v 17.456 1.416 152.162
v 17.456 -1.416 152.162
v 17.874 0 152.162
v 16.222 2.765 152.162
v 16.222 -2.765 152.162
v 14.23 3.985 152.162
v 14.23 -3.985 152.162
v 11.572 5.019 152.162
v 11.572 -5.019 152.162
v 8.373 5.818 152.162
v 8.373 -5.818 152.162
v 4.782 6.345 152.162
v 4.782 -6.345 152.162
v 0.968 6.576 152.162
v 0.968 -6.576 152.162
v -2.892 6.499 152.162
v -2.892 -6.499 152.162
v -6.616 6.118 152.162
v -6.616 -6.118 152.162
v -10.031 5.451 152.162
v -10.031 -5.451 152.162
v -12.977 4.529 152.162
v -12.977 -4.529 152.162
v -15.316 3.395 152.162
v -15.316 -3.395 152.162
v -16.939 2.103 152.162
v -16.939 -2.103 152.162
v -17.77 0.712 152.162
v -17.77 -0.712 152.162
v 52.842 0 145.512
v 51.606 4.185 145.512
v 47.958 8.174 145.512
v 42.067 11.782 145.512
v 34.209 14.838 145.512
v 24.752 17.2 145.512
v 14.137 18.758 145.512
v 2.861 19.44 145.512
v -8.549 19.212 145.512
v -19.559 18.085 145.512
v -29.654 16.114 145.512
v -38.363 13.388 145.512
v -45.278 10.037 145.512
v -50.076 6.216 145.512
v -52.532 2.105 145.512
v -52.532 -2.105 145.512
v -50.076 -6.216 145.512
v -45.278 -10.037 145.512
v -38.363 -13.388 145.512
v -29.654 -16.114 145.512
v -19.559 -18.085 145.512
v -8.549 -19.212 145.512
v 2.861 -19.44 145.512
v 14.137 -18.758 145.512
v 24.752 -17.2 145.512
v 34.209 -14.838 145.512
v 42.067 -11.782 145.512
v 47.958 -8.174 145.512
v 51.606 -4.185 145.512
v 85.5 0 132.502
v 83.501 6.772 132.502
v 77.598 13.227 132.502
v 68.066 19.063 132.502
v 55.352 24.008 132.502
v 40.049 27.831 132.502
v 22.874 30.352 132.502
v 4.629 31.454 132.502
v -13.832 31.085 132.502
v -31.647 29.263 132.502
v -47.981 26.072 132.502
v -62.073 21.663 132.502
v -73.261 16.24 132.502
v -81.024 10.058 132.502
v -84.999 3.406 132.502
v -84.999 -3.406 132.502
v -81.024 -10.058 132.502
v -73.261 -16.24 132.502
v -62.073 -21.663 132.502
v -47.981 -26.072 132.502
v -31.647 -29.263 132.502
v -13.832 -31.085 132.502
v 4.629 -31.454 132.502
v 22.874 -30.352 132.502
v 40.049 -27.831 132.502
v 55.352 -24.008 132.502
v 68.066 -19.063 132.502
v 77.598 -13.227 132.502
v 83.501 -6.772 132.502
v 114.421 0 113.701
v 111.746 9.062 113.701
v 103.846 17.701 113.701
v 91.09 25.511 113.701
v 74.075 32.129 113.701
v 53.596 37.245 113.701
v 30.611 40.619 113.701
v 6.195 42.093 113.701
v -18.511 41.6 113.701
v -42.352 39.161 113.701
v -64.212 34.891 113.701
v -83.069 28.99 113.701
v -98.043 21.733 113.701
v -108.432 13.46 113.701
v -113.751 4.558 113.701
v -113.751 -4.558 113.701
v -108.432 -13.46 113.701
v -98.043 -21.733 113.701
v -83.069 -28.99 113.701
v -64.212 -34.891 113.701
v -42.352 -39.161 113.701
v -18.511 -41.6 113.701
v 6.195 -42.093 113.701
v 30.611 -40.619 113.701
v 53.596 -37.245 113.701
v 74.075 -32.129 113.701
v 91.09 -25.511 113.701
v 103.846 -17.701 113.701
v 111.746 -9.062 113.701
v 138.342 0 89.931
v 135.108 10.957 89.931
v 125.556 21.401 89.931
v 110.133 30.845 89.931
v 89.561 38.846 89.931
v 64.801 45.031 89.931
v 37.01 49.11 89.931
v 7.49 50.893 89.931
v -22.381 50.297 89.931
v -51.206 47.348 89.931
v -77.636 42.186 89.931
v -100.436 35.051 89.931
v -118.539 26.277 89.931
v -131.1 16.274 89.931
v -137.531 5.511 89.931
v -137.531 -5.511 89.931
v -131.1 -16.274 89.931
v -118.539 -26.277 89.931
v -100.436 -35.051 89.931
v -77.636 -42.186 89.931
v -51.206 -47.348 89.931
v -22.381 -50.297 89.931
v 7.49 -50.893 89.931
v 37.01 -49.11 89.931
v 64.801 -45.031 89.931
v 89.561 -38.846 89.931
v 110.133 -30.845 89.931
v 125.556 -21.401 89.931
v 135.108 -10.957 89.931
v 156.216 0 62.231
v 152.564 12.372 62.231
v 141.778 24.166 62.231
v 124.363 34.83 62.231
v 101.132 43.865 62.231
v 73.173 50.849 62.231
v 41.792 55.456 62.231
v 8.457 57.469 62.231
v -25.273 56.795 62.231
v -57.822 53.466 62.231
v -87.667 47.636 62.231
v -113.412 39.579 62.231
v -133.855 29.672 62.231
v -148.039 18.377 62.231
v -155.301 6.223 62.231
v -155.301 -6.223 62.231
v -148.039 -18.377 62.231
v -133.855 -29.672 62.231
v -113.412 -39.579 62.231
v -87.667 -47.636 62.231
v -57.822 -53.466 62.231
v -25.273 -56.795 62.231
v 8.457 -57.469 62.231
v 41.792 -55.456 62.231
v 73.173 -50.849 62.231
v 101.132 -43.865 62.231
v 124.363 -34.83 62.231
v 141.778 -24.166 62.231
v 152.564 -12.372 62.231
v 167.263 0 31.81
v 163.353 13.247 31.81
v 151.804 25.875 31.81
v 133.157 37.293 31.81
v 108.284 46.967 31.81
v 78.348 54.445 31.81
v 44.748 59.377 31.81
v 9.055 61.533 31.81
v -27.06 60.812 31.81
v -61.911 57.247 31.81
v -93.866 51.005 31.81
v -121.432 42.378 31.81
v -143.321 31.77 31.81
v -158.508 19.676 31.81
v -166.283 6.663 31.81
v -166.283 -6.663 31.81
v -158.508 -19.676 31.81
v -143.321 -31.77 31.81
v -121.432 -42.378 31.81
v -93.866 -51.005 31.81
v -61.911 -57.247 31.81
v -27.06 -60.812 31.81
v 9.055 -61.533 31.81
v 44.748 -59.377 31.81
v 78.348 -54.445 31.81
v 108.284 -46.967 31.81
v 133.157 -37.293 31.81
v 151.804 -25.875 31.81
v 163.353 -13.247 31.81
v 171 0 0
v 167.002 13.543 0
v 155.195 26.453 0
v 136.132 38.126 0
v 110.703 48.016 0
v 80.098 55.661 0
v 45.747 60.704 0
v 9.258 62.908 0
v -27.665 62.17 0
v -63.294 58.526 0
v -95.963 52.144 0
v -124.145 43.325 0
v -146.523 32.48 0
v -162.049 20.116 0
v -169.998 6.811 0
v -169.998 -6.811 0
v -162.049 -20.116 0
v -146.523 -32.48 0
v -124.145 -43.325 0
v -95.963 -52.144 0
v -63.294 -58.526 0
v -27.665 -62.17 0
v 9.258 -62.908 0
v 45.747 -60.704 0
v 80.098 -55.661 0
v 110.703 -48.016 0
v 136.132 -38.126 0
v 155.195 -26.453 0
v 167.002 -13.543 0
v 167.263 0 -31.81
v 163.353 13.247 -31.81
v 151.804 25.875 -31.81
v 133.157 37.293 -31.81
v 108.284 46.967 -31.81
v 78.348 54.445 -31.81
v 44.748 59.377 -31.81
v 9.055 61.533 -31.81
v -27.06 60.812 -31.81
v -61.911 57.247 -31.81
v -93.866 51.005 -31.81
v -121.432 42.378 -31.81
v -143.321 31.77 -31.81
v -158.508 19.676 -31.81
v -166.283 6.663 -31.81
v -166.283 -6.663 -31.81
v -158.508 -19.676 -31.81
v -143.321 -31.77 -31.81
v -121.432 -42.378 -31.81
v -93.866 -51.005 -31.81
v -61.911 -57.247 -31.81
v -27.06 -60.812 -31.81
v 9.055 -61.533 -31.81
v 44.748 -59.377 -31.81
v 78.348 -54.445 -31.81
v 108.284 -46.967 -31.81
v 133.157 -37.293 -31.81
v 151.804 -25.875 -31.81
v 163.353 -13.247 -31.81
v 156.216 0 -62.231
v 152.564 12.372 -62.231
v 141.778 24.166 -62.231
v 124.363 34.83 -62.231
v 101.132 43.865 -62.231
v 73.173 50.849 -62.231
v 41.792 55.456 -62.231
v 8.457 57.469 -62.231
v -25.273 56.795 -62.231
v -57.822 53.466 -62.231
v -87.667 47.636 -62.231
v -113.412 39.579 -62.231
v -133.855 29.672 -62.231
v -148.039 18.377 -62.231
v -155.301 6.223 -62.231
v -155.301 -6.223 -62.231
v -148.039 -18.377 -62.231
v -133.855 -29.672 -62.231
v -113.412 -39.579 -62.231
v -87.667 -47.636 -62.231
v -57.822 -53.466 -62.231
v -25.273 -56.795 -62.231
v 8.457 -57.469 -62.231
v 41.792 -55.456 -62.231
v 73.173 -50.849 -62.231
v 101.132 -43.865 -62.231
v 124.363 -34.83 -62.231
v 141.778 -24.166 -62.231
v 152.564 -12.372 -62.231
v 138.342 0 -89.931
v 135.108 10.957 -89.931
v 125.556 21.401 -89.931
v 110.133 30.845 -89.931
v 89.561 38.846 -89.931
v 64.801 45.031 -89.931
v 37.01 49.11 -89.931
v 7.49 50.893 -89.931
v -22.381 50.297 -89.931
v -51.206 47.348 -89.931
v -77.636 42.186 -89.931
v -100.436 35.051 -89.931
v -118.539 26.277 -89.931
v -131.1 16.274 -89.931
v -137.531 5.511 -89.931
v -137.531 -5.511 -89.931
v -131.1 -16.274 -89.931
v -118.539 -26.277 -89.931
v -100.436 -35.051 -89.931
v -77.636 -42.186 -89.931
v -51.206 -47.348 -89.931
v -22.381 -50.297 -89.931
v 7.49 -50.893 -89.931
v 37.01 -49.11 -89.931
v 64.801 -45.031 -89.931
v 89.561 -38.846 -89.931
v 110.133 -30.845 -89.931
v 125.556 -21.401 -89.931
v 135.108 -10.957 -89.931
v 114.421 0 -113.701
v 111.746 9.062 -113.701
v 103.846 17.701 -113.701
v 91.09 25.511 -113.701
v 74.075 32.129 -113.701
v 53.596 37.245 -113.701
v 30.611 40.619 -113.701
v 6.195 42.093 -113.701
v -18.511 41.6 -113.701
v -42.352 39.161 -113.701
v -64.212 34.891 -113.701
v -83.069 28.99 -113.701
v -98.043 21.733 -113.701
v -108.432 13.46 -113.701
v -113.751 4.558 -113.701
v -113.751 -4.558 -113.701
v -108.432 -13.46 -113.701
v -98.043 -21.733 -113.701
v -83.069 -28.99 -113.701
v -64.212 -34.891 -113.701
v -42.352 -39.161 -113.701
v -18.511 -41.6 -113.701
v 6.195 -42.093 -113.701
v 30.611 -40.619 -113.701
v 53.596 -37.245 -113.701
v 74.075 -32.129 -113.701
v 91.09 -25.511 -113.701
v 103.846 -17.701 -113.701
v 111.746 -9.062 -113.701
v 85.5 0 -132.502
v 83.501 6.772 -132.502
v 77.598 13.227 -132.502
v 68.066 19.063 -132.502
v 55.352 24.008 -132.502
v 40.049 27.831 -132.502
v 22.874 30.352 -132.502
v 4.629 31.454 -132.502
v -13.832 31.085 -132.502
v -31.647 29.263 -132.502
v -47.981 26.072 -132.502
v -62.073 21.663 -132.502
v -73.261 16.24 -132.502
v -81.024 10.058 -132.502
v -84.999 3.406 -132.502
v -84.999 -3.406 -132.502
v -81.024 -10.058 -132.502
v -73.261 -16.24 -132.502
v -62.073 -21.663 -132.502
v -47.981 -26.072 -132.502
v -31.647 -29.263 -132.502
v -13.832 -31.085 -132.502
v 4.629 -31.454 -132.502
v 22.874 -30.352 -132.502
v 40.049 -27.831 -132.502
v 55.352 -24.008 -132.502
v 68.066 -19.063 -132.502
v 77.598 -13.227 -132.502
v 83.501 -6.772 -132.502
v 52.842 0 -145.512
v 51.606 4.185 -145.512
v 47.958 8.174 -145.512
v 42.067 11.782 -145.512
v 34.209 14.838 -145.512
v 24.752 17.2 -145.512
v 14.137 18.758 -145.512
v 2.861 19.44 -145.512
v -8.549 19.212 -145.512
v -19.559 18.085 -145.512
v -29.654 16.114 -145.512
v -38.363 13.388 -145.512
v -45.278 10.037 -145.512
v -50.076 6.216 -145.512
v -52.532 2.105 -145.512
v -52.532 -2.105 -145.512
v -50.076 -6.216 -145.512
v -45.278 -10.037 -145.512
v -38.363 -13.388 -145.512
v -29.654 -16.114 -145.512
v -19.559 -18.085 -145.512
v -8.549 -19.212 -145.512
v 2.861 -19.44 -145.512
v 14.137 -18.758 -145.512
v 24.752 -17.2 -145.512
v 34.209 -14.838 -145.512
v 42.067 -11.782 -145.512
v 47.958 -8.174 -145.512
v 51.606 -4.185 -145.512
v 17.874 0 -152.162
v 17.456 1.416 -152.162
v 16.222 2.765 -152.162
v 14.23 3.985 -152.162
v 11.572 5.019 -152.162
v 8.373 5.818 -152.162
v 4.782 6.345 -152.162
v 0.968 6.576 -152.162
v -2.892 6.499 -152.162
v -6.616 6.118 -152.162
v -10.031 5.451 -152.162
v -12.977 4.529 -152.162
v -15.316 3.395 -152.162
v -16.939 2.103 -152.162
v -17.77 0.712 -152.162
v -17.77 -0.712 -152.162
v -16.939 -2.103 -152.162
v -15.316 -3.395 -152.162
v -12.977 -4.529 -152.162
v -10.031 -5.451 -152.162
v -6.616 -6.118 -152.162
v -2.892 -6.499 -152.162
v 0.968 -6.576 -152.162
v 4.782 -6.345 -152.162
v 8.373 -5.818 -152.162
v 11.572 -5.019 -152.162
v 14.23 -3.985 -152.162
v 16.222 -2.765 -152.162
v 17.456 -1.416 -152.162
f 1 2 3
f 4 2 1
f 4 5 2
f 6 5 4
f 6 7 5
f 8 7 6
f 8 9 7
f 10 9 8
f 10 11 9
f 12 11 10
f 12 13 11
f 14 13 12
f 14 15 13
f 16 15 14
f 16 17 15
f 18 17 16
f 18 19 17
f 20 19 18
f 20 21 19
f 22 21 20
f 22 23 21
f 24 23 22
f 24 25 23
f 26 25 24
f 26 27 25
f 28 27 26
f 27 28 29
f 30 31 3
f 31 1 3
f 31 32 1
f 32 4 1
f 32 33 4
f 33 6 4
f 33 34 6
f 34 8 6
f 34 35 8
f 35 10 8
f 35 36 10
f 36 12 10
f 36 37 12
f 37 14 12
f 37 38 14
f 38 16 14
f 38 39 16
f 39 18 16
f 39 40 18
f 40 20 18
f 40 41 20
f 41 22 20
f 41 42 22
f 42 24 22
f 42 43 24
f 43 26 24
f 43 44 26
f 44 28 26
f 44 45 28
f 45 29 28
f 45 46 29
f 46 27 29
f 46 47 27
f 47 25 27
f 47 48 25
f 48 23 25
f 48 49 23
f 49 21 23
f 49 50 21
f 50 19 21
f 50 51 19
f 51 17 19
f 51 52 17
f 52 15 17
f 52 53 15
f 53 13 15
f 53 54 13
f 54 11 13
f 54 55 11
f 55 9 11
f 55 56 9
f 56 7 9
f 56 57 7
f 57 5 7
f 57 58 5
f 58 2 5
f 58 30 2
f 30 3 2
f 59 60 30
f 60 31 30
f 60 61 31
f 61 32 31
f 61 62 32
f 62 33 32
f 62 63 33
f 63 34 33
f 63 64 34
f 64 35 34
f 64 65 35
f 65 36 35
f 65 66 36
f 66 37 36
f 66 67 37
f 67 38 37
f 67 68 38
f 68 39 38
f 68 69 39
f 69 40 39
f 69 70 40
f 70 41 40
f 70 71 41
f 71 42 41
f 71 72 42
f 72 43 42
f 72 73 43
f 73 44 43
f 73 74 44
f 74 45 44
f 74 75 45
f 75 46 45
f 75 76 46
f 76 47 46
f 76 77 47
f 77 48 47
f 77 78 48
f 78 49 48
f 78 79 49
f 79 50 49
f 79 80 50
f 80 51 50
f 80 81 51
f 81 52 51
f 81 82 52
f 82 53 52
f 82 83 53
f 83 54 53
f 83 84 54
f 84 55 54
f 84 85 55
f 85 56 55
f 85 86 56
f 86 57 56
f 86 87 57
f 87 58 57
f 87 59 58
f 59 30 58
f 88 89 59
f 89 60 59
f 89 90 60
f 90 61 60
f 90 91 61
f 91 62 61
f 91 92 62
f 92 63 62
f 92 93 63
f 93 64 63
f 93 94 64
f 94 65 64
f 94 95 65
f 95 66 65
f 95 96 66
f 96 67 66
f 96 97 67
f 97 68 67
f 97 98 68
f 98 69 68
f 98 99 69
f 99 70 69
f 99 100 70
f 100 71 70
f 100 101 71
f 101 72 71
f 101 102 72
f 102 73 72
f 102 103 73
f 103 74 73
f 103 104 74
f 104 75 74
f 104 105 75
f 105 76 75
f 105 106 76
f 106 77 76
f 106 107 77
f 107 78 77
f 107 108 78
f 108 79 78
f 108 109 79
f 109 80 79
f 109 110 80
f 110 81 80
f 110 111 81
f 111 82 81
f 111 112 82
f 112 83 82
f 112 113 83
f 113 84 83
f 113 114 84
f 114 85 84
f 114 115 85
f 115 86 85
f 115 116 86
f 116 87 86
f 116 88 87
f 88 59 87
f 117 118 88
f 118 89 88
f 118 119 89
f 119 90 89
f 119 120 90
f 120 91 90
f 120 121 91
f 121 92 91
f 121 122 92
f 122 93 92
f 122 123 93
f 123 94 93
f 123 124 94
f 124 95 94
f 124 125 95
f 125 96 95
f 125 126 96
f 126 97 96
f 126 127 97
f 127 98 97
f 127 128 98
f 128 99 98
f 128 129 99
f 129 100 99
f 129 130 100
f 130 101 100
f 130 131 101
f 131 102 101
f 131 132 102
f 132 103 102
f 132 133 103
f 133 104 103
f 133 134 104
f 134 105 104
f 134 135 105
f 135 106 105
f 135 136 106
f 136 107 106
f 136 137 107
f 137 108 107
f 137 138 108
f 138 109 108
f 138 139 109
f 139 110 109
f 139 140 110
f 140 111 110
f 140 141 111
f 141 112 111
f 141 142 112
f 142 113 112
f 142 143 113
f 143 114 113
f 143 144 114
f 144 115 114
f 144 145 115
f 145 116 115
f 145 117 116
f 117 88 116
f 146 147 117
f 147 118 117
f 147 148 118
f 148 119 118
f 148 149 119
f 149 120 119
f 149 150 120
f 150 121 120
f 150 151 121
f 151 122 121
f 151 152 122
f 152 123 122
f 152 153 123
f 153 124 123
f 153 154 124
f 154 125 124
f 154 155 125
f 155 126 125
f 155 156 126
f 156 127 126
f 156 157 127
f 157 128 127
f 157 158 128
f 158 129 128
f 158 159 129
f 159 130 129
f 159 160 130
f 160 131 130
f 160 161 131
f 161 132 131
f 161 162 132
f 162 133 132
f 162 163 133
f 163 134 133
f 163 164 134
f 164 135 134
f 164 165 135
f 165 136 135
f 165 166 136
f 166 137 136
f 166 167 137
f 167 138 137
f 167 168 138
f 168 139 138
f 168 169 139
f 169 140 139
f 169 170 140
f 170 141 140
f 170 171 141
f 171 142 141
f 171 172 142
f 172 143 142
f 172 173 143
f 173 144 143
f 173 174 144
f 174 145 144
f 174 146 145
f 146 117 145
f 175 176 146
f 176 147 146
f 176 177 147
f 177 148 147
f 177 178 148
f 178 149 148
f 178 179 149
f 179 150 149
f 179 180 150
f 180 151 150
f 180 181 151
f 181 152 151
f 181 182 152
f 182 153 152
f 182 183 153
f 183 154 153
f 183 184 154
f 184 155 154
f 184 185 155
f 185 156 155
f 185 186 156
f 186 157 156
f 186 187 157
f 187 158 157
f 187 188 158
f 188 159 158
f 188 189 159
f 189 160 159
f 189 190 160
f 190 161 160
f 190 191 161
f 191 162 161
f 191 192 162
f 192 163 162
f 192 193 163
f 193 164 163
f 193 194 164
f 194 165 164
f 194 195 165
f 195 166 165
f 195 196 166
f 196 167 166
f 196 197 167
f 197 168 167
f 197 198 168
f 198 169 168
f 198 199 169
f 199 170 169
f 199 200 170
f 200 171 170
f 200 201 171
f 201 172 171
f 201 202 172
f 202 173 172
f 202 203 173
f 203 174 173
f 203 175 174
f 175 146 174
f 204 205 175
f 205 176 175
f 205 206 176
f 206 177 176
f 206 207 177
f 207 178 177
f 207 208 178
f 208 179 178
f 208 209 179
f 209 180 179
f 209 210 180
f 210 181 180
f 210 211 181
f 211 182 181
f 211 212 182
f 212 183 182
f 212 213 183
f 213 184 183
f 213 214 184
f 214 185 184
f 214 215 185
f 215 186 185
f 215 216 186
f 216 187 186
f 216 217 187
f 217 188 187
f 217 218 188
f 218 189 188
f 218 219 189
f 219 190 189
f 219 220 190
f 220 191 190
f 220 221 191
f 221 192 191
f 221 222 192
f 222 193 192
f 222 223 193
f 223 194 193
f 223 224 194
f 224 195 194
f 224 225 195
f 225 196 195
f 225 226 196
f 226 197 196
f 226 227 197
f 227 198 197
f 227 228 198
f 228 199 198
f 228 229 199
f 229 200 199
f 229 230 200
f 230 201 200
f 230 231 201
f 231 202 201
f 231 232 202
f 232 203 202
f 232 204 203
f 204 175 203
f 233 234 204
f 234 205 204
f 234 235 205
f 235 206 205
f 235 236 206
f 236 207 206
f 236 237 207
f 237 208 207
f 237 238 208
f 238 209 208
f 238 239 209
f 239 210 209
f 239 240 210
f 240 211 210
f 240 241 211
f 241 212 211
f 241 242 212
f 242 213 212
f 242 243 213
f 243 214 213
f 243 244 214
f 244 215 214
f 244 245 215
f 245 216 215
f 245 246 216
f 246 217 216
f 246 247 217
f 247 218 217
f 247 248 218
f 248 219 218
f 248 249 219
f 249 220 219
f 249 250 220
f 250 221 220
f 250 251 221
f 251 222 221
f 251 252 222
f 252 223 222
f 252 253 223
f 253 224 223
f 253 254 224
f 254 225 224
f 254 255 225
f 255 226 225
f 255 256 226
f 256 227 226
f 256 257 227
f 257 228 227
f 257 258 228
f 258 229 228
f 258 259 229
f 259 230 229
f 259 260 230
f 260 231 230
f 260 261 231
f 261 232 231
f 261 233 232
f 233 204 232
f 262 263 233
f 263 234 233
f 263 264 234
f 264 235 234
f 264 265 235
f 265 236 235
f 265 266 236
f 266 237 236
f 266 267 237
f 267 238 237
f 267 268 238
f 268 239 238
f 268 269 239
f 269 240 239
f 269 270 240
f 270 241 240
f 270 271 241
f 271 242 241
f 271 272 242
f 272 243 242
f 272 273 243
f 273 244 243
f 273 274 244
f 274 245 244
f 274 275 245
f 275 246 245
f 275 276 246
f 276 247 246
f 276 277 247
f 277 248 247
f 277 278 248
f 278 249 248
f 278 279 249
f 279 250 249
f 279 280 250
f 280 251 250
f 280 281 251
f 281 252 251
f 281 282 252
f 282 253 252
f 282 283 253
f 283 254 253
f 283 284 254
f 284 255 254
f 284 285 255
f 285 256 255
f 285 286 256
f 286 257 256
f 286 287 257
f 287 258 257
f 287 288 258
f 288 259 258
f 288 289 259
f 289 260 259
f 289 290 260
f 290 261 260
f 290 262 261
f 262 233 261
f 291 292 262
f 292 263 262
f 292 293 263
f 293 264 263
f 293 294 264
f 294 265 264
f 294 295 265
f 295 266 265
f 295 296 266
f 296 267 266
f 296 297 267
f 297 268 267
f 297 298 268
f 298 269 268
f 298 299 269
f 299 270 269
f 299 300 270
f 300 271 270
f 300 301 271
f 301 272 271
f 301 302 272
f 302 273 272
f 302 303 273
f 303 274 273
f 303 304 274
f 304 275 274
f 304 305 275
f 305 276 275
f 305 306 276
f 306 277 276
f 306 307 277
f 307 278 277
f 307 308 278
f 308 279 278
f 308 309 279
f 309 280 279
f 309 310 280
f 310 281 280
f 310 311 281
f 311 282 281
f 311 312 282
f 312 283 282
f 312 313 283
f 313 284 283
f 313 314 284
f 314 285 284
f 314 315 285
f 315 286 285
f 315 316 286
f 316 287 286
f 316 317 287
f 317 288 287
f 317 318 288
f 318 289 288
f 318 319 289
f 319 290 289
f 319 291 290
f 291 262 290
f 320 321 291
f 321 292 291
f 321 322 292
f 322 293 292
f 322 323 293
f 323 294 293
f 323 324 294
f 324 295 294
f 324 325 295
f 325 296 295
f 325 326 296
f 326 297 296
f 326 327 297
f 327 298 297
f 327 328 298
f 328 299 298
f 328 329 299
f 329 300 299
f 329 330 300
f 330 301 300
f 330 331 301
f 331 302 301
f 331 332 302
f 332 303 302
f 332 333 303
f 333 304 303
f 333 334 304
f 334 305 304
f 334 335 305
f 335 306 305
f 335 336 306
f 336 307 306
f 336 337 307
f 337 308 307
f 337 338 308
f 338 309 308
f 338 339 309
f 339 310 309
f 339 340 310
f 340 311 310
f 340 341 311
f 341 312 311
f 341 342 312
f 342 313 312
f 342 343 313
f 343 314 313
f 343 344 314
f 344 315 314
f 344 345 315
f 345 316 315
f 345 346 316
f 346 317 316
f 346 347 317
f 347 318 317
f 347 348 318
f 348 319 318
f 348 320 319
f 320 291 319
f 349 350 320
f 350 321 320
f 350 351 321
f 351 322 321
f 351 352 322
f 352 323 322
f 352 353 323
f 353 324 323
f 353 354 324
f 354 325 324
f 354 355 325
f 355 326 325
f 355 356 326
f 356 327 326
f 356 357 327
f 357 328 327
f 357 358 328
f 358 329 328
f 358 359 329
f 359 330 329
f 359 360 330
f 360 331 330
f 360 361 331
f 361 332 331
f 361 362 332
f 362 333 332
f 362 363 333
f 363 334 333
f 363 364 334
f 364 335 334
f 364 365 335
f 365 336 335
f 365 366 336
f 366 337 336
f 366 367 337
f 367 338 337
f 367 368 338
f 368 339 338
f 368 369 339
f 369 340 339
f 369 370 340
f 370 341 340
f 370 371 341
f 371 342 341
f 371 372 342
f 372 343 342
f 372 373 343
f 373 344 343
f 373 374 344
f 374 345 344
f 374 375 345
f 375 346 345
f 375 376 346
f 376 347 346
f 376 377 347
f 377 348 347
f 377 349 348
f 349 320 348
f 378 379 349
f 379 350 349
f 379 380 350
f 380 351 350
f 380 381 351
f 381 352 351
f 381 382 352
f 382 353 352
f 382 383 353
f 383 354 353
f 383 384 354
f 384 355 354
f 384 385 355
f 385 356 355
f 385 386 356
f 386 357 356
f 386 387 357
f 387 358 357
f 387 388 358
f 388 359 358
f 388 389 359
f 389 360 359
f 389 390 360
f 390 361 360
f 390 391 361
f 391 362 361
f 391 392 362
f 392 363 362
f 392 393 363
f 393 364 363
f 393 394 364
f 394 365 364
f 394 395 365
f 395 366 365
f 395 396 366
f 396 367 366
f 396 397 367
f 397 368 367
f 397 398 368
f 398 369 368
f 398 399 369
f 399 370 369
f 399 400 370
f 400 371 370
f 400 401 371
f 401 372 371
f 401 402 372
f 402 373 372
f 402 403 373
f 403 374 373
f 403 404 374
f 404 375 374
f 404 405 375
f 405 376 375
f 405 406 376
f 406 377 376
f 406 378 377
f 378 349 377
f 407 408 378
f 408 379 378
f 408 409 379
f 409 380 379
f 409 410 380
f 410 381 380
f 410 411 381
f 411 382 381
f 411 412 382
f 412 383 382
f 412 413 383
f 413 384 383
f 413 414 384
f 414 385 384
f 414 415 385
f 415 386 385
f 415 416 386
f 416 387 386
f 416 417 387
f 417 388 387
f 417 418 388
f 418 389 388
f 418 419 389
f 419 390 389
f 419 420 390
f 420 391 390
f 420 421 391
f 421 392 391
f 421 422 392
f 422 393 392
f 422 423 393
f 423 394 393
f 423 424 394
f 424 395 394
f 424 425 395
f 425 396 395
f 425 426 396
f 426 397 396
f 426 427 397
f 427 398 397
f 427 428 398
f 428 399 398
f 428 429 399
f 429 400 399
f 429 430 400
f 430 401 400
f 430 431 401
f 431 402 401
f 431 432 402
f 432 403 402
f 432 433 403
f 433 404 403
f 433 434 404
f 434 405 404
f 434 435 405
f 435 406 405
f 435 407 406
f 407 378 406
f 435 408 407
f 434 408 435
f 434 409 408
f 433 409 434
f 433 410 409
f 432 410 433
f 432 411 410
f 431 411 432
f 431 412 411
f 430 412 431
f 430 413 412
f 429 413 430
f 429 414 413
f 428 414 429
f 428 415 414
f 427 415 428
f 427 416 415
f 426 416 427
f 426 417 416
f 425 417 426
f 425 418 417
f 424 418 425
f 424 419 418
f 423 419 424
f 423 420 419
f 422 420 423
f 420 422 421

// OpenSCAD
// Generated by SolidPython 1.0.1 on 2020-07-29 00:46:53


scale(v = [19, 7, 17]) {
	sphere(r = 9);
}
/***********************************************
*********      SolidPython code:      **********
************************************************
 
# import packages: SolidPython
from solid import *
from solid.utils import *
from itertools import chain, combinations, permutations


class Resize:

    def __init__(self, scad_file):
        self.scad_file = scad_file
        #self.scad_file = import_scad(scad_file)
        # cone/cylinder param:
        self.r1 = 0
        self.r2 = 0
        self.h = 0
        # rectangular prism param:
        self.w = 0
        self.l = 0
        # ellipse param:
        self.r = 0

    # import OpenScad code (file name corresponds to shape)


    # classify shape + parameters
    def assign(self, param1, param2, param3):
        if self.scad_file == 'cone.scad':
            self.r1 = param1
            self.r2 = param2
            self.h = param3
        elif self.scad_file == 'cylinder.scad':
            self.r1 = param1
            self.r2 = param2
            self.h = param3
        elif self.scad_file == 'rectangularPrism.scad':
            self.h = param1
            self.l = param2
            self.w = param3
        else:
            self.r = param1
            self.h = param2

    # resize parameters
    def iterate(self):
        x = range(3, 20, 2)
        i = 1
        if self.scad_file == 'cone.scad':
            tempList = list(permutations(x, 2))
            for temp in tempList:
                param1 = temp[0]
                param2 = temp[1]
                filepath = 'produced_scad_files/' + 'cone' + str(param1) + '_' + str(param2) + '_' + '.scad'
                scad_render_to_file(cylinder(h=param1, r1=param2, r2=0), filepath)

        elif self.scad_file == 'cylinder.scad':
            tempList = list(permutations(x, 3))
            for temp in tempList:
                param1 = temp[0]
                param2 = temp[1]
                filepath = 'produced_scad_files/' + 'cylinder' + str(param1) + '_' + str(param2) + '_' + '.scad'
                scad_render_to_file(cylinder(h=param1, r1=param2, r2=param2), filepath)

        elif self.scad_file == 'rectangularPrism.scad':
            tempList = list(permutations(x, 3))
            for temp in tempList:
                param1 = temp[0]
                param2 = temp[1]
                param3 = temp[2]
                filepath = 'produced_scad_files/' + 'rectangularPrism' + str(param1) + '_' + str(param2) + '_' + str(
                    param3) + '.scad'
                scad_render_to_file(cube(size=(param1, param2, param3)), filepath)

        elif self.scad_file == 'ellipse.scad':
            tempList = list(permutations(x, 4))
            for temp in tempList:
                param1 = temp[0]
                param2 = temp[1]
                param3 = temp[2]
                param4 = temp[3]
                filepath = 'produced_scad_files/' + 'ellipse' + str(param1) + '_' + str(param2) + '_' + str(param3) + '_' + str(param4) + '.scad'
                scad_render_to_file(scale([param1, param2, param3])(sphere(r=param4)), filepath)

    def render_to_scadfile(self):
        scad_render_to_file(scad, 'example.scad') 
 
************************************************/
